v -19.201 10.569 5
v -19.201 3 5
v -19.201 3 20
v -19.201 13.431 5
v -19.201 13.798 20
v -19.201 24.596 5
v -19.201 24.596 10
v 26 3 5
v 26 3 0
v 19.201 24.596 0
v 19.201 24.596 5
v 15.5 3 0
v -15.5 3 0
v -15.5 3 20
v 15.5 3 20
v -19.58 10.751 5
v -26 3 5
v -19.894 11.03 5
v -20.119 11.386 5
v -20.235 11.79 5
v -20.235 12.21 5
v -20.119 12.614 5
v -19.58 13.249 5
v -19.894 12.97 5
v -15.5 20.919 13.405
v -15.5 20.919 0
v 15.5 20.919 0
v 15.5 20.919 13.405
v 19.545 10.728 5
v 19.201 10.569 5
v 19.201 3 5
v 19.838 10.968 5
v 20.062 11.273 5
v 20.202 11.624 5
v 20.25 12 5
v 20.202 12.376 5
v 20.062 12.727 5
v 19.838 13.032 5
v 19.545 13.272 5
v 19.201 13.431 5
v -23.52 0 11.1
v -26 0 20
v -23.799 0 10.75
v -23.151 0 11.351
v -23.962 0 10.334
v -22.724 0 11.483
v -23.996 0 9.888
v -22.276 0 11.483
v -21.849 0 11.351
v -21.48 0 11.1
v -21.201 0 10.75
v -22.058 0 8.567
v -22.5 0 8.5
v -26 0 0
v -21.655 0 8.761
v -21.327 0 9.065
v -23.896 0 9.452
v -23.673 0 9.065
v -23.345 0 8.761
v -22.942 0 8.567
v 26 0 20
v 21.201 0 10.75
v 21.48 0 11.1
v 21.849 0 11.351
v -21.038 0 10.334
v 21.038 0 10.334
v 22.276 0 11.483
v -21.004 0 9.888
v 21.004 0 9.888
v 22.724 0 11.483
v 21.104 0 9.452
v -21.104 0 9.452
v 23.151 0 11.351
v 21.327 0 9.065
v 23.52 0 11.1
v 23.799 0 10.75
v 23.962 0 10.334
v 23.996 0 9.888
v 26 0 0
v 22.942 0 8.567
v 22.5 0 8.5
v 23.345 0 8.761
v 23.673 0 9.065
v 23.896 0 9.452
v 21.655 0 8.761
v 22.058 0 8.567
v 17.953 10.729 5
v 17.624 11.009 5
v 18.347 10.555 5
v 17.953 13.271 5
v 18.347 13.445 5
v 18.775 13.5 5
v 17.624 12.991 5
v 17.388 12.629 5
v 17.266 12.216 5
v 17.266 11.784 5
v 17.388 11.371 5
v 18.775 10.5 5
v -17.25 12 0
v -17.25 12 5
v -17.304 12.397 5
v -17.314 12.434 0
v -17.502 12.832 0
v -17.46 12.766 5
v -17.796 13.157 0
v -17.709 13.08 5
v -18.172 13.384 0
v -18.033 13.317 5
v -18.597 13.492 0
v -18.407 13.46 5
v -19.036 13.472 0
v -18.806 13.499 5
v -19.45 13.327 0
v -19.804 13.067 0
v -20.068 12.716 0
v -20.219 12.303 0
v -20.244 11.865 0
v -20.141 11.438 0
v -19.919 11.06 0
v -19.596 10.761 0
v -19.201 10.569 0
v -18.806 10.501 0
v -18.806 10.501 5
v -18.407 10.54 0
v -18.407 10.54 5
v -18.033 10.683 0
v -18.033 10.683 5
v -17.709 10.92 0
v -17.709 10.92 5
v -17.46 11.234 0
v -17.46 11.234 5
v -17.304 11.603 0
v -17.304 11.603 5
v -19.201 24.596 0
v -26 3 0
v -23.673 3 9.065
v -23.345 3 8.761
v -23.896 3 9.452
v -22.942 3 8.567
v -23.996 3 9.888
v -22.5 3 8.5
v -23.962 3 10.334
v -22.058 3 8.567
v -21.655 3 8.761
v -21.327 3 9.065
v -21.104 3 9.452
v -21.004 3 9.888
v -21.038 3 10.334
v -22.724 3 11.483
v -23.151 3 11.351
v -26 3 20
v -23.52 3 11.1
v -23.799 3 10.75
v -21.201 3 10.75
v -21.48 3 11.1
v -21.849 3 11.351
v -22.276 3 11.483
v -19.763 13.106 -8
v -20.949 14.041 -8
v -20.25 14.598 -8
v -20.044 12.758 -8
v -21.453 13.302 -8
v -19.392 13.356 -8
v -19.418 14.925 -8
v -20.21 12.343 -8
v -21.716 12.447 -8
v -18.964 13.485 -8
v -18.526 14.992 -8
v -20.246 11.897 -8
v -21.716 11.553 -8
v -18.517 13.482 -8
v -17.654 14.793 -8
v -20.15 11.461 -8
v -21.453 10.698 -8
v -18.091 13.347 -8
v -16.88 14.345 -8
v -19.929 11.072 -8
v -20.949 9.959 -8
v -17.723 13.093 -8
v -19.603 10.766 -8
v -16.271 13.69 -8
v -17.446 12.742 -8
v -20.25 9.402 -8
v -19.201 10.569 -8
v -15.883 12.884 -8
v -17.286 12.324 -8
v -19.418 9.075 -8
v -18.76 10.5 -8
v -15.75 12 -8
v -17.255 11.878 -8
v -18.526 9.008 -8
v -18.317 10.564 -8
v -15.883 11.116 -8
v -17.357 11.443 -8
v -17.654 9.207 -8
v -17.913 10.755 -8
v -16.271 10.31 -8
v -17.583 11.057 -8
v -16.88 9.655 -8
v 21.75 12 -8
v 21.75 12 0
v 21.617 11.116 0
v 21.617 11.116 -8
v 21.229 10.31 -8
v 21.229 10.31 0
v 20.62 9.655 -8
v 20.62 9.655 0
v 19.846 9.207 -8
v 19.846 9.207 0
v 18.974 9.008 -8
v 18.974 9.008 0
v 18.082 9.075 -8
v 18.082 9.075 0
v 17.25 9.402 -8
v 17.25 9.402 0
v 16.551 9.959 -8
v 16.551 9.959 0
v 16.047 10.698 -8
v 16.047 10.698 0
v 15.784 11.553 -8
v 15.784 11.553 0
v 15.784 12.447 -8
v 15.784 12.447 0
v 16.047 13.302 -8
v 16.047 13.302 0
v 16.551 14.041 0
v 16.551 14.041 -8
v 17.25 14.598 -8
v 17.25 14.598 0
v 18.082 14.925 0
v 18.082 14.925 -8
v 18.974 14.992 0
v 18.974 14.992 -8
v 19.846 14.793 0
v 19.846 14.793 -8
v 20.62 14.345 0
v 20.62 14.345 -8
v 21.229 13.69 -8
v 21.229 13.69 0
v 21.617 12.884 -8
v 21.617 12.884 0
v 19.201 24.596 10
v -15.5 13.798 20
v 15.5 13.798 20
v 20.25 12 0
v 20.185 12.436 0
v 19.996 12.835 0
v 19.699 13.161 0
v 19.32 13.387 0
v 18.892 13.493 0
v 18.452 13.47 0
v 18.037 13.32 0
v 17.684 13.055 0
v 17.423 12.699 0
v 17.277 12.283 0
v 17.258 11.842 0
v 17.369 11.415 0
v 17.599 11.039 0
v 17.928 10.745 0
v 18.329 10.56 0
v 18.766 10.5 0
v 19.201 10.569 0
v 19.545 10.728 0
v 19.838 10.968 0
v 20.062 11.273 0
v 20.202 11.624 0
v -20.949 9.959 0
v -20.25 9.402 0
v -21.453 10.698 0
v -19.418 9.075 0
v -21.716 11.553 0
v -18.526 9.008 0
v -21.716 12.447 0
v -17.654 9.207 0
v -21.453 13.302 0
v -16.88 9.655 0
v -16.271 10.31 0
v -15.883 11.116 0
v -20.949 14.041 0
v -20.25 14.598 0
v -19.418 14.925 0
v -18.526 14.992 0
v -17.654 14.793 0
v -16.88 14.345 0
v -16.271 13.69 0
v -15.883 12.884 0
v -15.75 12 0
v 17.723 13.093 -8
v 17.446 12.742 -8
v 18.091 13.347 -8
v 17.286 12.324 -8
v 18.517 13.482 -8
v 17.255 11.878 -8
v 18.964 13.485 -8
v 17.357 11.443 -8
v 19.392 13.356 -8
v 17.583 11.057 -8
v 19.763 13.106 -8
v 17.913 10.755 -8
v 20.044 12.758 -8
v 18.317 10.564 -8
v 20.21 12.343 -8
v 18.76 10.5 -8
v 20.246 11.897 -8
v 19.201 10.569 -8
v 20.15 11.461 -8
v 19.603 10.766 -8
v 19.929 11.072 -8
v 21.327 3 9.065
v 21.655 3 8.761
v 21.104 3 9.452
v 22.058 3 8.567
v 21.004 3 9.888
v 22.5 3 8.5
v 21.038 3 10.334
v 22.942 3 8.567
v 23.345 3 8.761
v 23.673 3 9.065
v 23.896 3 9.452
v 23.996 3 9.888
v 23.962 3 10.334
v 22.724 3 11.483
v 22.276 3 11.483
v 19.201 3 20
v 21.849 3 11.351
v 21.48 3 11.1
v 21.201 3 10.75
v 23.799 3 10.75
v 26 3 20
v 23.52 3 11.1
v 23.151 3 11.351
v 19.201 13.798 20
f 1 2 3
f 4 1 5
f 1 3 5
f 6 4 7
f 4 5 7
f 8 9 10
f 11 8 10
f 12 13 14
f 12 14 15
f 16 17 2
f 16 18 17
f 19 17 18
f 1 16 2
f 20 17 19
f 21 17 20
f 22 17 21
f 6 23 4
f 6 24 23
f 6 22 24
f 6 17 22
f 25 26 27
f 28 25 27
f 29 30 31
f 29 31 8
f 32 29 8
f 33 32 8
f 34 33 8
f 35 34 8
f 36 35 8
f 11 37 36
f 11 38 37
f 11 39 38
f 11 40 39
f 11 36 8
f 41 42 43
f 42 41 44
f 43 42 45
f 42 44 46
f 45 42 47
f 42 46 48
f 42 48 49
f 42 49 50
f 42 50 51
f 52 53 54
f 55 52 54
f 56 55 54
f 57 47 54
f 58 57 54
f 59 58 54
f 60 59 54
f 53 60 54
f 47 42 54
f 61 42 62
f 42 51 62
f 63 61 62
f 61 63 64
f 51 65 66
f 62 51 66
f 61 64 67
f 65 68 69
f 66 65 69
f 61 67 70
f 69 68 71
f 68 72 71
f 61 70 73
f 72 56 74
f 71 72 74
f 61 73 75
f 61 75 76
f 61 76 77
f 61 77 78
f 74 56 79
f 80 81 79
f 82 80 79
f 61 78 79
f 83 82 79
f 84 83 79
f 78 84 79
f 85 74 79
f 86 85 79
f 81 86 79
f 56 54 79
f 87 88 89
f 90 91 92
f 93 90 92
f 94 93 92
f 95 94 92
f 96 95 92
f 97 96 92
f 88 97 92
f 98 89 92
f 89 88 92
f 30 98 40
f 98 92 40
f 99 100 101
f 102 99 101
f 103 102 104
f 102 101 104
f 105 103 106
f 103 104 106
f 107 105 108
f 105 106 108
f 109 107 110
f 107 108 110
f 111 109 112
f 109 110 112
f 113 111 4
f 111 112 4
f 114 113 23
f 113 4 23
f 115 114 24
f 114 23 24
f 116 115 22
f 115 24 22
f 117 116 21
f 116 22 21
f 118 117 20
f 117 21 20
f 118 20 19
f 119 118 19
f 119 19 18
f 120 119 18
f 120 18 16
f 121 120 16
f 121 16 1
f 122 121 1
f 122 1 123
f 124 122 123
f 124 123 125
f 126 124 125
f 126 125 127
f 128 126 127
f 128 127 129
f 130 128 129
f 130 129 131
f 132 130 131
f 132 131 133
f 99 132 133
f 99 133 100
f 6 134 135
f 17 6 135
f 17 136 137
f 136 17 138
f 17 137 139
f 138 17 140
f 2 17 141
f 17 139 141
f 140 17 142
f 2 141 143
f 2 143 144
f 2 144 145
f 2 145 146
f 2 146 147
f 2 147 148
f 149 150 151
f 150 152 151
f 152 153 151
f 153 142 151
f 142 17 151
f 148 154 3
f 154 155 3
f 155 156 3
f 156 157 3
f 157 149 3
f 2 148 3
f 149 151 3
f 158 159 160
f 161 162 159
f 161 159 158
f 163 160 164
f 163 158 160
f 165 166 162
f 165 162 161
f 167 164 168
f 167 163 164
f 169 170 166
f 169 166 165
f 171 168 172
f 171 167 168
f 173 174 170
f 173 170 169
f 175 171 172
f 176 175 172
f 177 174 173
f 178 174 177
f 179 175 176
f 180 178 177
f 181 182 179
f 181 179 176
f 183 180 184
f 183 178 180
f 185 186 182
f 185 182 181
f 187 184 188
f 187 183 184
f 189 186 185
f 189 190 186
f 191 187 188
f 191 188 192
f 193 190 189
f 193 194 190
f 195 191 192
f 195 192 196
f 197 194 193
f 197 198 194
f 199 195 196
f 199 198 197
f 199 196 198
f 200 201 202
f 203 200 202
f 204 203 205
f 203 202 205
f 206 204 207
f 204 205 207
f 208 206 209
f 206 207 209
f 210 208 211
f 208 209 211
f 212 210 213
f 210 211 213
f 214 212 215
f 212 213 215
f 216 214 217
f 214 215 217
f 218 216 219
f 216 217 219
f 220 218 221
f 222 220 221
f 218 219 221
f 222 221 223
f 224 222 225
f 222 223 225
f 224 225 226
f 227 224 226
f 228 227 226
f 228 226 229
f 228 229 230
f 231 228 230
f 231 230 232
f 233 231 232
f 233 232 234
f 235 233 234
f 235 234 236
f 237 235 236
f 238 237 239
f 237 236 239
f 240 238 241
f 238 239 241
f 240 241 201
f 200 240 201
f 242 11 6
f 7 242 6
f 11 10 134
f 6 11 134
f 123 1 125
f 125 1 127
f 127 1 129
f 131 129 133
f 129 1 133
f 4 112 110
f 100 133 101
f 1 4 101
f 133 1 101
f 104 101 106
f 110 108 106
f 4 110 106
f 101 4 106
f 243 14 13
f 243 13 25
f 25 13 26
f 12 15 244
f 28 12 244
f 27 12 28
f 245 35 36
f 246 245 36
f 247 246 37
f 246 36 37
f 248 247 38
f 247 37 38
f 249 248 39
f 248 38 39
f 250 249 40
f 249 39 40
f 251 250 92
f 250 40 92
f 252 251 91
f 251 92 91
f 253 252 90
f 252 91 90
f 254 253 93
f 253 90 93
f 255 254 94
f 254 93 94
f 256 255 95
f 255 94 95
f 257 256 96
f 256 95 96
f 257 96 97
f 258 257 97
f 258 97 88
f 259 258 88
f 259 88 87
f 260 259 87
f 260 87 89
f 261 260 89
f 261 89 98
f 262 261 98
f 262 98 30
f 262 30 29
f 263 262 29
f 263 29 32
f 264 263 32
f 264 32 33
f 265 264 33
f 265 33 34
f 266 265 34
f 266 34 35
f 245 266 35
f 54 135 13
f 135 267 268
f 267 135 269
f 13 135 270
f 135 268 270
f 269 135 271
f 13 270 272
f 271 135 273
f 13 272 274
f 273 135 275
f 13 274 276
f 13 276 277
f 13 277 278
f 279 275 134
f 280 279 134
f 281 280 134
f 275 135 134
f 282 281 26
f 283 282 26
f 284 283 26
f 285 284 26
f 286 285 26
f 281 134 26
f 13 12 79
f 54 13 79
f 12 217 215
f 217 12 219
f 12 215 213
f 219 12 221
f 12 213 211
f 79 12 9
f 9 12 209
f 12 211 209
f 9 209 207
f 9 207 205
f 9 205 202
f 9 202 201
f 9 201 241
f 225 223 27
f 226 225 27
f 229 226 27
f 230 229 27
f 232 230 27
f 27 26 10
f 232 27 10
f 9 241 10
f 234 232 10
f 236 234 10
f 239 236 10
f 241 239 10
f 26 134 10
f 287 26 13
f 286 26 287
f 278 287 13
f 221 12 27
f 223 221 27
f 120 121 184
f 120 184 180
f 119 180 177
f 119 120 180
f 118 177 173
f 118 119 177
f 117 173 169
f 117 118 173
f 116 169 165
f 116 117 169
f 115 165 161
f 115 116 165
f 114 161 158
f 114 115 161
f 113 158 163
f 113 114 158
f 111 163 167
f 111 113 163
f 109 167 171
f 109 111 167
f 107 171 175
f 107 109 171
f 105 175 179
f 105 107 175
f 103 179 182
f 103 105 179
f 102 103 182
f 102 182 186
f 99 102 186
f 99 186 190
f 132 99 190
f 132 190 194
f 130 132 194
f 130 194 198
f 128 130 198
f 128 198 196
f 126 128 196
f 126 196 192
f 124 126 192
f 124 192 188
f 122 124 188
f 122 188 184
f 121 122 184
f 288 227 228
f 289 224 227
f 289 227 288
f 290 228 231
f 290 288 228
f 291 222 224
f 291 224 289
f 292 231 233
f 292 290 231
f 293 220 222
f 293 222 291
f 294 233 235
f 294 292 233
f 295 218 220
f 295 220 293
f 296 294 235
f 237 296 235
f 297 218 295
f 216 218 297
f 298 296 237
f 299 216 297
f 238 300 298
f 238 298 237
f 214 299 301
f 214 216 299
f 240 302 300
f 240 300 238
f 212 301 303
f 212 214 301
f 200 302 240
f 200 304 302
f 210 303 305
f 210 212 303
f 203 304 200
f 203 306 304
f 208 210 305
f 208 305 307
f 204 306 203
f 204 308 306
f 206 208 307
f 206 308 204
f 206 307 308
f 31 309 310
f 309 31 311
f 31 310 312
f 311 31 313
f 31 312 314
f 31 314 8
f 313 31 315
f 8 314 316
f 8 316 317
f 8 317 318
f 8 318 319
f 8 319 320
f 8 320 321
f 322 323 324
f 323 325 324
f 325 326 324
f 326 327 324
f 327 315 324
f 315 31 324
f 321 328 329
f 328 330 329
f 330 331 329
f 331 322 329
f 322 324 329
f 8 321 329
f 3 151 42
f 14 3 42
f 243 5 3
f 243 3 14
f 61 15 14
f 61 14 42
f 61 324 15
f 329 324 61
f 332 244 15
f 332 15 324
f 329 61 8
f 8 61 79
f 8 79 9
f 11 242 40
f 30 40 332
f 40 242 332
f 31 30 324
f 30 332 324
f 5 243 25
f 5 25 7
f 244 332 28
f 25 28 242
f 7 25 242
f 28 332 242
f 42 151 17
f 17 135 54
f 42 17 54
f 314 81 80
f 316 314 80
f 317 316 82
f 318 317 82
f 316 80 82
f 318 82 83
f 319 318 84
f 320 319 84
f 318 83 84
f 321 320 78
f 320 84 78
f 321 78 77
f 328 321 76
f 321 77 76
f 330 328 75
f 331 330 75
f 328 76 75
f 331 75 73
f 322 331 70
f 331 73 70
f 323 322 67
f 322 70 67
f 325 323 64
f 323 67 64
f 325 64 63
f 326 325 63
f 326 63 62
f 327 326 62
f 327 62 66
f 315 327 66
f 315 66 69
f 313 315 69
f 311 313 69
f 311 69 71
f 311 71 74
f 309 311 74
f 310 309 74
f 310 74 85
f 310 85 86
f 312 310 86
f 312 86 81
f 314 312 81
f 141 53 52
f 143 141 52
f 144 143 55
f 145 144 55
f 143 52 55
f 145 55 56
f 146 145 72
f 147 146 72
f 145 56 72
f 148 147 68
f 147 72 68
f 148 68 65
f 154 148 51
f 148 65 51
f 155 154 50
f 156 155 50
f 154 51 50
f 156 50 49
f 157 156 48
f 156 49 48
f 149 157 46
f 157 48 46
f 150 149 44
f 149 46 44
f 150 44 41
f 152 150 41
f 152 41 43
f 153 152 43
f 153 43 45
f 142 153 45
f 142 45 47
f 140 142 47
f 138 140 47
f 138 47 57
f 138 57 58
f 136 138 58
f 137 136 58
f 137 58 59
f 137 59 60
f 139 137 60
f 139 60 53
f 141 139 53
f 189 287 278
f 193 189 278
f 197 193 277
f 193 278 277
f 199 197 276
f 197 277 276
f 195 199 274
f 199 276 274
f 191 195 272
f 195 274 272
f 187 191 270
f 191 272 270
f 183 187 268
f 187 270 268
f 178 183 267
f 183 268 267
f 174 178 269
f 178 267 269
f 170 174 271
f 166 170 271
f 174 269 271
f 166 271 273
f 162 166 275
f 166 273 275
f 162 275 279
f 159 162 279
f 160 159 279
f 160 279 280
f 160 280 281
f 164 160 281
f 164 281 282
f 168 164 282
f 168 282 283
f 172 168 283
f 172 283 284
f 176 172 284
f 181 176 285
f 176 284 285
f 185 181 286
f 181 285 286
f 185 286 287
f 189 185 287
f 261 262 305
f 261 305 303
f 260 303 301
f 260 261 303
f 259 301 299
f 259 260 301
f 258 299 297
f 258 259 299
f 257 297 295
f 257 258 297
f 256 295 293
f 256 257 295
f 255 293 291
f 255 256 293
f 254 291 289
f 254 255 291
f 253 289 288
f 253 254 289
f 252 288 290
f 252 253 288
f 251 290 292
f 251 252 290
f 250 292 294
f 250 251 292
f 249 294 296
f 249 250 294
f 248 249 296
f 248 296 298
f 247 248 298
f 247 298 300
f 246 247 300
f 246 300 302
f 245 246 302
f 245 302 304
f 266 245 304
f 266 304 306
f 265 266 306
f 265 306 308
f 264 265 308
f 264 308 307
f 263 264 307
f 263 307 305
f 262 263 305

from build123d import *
from build123d.topology import SkipClean

# Parameters (mm, degrees)
SKETCH_1_W          = 31
SKETCH_1_H          = 17.919280428
EXTRUDE_1_DEPTH     = 20
CUT_EXTRUDE_1_DEPTH = 46
CUT_EXTRUDE_2_DEPTH = 15
SKETCH_4_R          = 1.5
CUT_EXTRUDE_3_DEPTH = 15
SKETCH_5_R          = 1.5
CUT_EXTRUDE_4_DEPTH = 10
SKETCH_6_R          = 3
SKETCH_6_R_2        = 1.5
EXTRUDE_2_DEPTH     = 8


with BuildPart() as part:
    # 草图1 → 凸台-拉伸1 (new body)
    with BuildSketch(Plane.XY):
        Polygon((-26, 0), (26, 0), (26, 3), (19.201257588, 24.596005308), (-19.201257588, 24.596005308), (-26, 3), align=None)
        with Locations((0, 11.959640214)):
            Rectangle(SKETCH_1_W, SKETCH_1_H, mode=Mode.SUBTRACT)
    extrude(amount=EXTRUDE_1_DEPTH)

    # 草图2 → 切除-拉伸1 (cut, symmetric)
    with BuildSketch(Plane(origin=(-15.5, 0, 0), x_dir=(0, 0, -1), z_dir=(1, 0, 0))):
        Polygon((-20, 13.798002654), (-10, 24.596005308), (-20, 24.596005308), align=None)
    extrude(amount=CUT_EXTRUDE_1_DEPTH, both=True, mode=Mode.SUBTRACT)

    # 草图3 → 切除-拉伸2 (cut)
    with BuildSketch(Plane.XY.offset(20)):
        Polygon((19.201257588, 24.596005308), (19.201257588, 3), (26, 3), align=None)
        Polygon((-19.201257588, 24.596005308), (-26, 3), (-19.201257588, 3), align=None)
    extrude(amount=-CUT_EXTRUDE_2_DEPTH, mode=Mode.SUBTRACT)

    # 草图4 → 切除-拉伸3 (cut)
    with BuildSketch(Plane.XZ):
        with Locations(Location((-22.5, 10, 0), (0, 0, 270))):
            Circle(SKETCH_4_R)
        with Locations(Location((22.5, 10, 0), (0, 0, 270))):
            Circle(SKETCH_4_R)
    extrude(amount=-CUT_EXTRUDE_3_DEPTH, mode=Mode.SUBTRACT)

    # 草图5 → 切除-拉伸4 (cut)
    with BuildSketch(Plane.XY.offset(5)):
        with Locations((-18.75, 12)):
            Circle(SKETCH_5_R)
        with Locations((18.75, 12)):
            Circle(SKETCH_5_R)
    extrude(amount=-CUT_EXTRUDE_4_DEPTH, mode=Mode.SUBTRACT)

    # 草图6 → 凸台-拉伸2 (add)
    # profile 1 of 2: a face of its own
    with SkipClean():  # the faces are left unmerged after this step: merging them gives an invalid solid
        with BuildSketch(Plane(origin=(0, 0, 0), x_dir=(-1, 0, 0), z_dir=(0, 0, -1))):
            with Locations(Location((18.75, 12, 0), (0, 0, 180))):
                Circle(SKETCH_6_R)
            with Locations(Location((18.75, 12, 0), (0, 0, 287.507965853))):
                Circle(SKETCH_6_R_2, mode=Mode.SUBTRACT)
        # profile 2 of 2: a face of its own
        with BuildSketch(Plane(origin=(0, 0, 0), x_dir=(-1, 0, 0), z_dir=(0, 0, -1))):
            with Locations(Location((-18.75, 12, 0), (0, 0, 180))):
                Circle(SKETCH_6_R)
            with Locations(Location((-18.75, 12, 0), (0, 0, 252.492034147))):
                Circle(SKETCH_6_R_2, mode=Mode.SUBTRACT)
        extrude(amount=EXTRUDE_2_DEPTH)


solid = part.part
